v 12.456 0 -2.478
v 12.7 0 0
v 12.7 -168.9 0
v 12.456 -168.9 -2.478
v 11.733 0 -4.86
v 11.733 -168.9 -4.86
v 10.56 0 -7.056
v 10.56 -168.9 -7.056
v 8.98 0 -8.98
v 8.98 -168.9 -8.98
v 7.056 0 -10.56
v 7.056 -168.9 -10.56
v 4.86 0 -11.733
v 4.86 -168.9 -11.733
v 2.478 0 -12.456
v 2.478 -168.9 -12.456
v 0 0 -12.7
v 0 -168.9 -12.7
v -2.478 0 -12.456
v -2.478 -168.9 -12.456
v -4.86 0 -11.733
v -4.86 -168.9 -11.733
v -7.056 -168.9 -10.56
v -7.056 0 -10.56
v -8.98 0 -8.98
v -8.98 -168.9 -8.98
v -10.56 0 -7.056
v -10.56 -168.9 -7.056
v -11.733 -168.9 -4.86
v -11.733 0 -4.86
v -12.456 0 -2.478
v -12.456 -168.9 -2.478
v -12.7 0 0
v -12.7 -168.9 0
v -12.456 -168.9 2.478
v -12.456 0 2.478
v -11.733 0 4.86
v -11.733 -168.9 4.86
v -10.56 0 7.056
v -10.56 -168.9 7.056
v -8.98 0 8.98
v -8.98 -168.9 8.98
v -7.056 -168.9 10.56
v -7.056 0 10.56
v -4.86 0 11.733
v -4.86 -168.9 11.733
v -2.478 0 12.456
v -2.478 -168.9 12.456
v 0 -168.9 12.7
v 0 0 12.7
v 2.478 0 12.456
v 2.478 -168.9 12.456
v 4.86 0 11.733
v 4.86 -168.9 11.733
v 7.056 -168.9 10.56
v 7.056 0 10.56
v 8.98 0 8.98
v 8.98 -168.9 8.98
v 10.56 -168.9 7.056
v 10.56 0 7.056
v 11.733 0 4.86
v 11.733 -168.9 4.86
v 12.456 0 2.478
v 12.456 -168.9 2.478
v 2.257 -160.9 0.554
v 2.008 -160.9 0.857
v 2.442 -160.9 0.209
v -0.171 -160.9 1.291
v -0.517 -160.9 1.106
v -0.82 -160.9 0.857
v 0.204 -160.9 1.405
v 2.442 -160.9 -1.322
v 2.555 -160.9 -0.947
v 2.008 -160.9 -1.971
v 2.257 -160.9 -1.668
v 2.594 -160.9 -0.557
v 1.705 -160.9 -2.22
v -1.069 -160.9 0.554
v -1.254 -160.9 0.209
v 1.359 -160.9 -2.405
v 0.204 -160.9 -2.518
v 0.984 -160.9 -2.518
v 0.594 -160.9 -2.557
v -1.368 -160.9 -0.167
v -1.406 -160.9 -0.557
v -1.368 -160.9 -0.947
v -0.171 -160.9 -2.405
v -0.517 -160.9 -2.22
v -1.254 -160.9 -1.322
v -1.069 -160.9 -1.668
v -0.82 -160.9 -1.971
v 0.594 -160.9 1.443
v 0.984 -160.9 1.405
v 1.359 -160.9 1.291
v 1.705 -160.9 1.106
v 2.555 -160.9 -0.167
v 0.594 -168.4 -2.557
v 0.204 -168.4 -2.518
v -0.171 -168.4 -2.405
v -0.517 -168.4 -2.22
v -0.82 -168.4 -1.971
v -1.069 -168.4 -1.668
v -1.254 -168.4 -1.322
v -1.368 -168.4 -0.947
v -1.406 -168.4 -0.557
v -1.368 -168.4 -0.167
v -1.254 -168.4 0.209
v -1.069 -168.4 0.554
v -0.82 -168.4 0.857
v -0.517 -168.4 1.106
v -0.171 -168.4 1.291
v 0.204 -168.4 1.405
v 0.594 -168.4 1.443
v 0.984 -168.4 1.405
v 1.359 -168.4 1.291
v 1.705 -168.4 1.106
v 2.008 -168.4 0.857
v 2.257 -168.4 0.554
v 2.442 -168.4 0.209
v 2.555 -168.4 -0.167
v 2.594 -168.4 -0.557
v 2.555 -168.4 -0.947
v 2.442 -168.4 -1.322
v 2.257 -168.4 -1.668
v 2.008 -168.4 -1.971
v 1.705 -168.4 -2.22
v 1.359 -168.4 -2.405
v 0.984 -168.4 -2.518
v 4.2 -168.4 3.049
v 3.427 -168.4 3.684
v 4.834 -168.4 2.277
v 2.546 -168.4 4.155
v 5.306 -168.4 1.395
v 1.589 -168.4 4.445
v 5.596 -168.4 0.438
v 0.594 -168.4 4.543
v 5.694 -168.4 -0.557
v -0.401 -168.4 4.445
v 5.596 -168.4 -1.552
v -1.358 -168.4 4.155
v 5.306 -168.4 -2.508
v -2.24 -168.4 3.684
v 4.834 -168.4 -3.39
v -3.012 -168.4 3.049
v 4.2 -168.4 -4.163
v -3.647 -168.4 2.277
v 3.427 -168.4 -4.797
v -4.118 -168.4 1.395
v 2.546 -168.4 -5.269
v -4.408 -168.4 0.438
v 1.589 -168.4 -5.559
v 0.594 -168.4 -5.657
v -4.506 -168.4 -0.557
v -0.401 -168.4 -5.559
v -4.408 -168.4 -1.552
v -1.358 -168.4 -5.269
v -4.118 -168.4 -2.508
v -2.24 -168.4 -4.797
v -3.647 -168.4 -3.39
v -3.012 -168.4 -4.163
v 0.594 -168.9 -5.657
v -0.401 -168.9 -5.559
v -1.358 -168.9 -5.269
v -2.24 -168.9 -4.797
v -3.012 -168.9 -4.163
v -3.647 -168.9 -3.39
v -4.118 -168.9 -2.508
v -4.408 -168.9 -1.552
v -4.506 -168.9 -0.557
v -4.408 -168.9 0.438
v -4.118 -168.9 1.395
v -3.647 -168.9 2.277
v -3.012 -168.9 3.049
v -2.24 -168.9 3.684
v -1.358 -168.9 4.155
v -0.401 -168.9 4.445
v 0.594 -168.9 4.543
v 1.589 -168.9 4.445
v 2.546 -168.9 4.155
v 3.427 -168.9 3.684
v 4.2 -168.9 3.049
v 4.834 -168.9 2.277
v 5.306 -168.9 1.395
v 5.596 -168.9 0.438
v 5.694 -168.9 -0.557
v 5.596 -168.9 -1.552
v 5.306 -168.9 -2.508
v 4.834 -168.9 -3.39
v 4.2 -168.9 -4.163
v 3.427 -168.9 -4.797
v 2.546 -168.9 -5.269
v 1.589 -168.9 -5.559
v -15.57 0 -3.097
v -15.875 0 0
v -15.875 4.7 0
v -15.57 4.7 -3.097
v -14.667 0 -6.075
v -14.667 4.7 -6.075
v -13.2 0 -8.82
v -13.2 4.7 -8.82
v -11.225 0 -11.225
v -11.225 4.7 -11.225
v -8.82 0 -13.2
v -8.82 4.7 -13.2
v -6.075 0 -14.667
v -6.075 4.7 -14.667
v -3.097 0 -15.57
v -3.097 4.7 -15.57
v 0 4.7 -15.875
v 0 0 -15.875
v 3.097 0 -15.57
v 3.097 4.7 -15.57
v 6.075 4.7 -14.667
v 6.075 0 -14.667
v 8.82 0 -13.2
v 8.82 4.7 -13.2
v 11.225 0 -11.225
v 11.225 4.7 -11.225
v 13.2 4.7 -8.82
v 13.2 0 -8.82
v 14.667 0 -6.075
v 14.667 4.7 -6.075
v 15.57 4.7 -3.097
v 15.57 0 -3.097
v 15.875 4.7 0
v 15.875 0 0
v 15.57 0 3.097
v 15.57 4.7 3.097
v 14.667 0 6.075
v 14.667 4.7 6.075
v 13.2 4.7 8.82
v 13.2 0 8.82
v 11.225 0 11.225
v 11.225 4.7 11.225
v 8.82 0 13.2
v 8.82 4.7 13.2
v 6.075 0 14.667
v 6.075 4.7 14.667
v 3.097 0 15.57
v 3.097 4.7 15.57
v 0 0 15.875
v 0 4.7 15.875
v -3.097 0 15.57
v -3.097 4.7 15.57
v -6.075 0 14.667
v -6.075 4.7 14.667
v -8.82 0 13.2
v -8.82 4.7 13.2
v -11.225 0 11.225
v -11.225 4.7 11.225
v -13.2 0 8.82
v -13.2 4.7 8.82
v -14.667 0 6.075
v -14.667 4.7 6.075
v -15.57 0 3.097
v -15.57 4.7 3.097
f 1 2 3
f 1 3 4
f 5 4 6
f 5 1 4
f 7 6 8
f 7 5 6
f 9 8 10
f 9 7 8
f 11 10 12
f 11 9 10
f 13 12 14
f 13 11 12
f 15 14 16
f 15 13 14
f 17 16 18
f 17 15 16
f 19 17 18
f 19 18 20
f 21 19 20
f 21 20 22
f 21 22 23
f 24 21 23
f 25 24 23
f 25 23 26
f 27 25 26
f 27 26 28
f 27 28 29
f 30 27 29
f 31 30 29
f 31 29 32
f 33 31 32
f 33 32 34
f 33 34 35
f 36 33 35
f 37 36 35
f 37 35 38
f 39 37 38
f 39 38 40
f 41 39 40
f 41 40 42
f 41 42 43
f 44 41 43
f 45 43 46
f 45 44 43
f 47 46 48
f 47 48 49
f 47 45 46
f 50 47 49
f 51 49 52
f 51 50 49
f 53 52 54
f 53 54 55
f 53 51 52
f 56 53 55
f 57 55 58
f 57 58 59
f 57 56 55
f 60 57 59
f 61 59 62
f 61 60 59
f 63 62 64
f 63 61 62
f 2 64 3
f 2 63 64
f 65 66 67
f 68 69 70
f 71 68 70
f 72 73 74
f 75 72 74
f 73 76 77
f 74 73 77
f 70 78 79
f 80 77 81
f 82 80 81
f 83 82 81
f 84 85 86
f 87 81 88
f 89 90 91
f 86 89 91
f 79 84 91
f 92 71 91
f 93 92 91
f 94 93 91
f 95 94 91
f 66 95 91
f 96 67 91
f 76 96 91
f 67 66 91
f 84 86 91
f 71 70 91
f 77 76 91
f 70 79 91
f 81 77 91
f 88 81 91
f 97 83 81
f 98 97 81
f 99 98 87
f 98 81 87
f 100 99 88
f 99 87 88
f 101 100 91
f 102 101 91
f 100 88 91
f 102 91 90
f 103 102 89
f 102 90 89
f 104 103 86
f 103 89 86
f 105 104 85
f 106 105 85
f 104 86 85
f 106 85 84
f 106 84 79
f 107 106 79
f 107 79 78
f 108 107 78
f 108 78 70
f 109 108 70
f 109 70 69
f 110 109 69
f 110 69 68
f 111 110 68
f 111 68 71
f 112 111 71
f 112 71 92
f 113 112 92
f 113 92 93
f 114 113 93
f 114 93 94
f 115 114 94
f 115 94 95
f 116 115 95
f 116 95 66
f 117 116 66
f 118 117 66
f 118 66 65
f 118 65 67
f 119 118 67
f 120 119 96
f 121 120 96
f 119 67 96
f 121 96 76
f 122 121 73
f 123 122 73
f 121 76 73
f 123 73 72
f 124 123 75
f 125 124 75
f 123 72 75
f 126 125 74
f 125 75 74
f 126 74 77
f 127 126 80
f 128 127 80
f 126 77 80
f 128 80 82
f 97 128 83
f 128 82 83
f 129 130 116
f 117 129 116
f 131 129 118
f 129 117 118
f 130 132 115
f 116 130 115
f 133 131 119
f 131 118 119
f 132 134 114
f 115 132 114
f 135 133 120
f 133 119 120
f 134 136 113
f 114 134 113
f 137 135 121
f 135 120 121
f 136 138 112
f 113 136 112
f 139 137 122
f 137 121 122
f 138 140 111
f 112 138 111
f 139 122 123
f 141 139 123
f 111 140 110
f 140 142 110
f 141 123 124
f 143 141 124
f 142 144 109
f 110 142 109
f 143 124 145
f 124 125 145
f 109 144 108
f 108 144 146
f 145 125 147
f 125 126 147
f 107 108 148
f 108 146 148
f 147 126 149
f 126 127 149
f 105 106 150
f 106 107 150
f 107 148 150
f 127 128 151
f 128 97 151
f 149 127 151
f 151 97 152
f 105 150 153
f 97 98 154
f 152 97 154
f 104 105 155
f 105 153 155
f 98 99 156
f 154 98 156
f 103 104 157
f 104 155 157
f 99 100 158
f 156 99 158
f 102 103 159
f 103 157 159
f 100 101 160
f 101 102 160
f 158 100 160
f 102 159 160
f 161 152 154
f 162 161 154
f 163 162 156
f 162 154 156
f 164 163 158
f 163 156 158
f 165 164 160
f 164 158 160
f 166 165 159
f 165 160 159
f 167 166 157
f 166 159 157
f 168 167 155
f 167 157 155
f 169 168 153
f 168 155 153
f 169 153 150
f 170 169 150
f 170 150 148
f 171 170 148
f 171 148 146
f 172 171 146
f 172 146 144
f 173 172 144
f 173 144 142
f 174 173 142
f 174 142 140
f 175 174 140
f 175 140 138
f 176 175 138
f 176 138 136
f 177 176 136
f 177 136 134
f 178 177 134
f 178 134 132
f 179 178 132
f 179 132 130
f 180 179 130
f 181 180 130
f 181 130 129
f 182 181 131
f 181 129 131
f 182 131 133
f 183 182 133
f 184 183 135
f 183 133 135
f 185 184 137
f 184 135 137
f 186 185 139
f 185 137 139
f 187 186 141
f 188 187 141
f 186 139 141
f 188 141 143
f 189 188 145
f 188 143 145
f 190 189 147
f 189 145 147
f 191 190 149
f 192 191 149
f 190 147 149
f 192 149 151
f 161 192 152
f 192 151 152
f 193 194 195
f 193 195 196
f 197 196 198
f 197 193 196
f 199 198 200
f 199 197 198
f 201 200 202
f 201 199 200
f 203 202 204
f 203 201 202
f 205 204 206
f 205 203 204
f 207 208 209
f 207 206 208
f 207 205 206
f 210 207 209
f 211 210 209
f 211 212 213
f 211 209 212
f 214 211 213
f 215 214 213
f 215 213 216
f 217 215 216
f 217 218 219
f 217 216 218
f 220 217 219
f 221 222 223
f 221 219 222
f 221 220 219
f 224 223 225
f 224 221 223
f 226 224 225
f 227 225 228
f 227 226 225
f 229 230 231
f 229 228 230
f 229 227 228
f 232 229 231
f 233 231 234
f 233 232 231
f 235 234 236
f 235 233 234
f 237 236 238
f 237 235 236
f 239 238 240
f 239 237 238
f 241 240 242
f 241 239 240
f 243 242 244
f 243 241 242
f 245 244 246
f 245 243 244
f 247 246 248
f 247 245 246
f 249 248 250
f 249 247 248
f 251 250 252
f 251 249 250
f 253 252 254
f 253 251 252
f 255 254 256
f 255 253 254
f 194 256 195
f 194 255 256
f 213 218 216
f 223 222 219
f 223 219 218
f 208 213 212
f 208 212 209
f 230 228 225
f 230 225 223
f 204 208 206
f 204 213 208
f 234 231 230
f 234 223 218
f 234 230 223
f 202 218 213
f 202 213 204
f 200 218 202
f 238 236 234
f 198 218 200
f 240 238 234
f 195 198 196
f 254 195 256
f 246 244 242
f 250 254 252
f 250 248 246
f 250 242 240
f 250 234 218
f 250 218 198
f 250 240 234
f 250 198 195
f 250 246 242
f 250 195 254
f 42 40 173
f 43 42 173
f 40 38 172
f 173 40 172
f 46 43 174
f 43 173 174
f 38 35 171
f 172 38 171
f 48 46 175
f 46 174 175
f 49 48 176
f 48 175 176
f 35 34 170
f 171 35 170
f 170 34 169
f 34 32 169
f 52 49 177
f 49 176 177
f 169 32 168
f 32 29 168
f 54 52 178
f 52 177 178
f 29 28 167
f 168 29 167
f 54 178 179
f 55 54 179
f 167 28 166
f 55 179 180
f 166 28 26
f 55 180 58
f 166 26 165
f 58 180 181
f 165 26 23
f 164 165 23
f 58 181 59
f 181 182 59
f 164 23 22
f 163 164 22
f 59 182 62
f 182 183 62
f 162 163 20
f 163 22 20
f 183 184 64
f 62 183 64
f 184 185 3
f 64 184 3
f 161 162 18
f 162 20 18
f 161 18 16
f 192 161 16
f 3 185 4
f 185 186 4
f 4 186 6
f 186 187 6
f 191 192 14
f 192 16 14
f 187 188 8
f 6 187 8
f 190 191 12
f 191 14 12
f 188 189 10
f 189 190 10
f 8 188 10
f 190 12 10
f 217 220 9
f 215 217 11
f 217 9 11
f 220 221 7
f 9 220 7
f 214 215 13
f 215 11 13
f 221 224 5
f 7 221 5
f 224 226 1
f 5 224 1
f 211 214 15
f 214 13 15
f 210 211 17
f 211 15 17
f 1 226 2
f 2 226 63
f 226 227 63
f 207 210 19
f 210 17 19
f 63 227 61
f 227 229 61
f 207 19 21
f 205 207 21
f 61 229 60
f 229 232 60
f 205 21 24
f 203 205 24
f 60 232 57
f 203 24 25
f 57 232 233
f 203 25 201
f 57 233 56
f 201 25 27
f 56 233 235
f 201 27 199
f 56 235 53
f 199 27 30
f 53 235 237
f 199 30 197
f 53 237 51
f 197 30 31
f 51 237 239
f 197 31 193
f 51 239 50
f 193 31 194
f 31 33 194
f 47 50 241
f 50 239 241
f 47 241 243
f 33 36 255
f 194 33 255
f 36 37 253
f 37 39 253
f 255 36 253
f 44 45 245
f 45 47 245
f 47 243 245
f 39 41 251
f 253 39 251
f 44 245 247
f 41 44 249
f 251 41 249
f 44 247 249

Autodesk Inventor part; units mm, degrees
ref_plane "YZ Plane" through (0, 0, 0) normal (1, 0, 0) x (0, 1, 0)
ref_plane "XZ Plane" through (0, 0, 0) normal (0, 1, 0) x (-1, 0, 0)
ref_plane "XY Plane" through (0, 0, 0) normal (0, 0, 1) x (1, 0, 0)
sketch "Boceto1" plane through (0, 0, 0) normal (0, 1, 0) x (-1, 0, 0)
  circle A0 centre (0, 0) radius 12.7
  circle A1 centre (0, 0) radius 15.875
  dimension "d0" = 25.4
  dimension "d1" = 31.75
extrude "Extrusión1" add sketch "Boceto1" along normal blind 4.7
sketch "Boceto2" plane through (0, 4.7, 0) normal (0, 1, 0) x (1, 0, 0)
  circle A0 centre (0, 0) radius 12.7
  dimension "d4" = 25.4
extrude "Extrusión2" add sketch "Boceto2" against normal blind 173.6
hole "Agujero1" at (0.5939, -168.9, -0.5568) direction (0, 1, 0) diameter 4 depth 8 counterbore diameter 10.2 counterbore depth 0.5
thread "Rosca1" size "M4x0.7" class "6H" standard "ANSI Metric M Profile" full length
properties part number "post"
